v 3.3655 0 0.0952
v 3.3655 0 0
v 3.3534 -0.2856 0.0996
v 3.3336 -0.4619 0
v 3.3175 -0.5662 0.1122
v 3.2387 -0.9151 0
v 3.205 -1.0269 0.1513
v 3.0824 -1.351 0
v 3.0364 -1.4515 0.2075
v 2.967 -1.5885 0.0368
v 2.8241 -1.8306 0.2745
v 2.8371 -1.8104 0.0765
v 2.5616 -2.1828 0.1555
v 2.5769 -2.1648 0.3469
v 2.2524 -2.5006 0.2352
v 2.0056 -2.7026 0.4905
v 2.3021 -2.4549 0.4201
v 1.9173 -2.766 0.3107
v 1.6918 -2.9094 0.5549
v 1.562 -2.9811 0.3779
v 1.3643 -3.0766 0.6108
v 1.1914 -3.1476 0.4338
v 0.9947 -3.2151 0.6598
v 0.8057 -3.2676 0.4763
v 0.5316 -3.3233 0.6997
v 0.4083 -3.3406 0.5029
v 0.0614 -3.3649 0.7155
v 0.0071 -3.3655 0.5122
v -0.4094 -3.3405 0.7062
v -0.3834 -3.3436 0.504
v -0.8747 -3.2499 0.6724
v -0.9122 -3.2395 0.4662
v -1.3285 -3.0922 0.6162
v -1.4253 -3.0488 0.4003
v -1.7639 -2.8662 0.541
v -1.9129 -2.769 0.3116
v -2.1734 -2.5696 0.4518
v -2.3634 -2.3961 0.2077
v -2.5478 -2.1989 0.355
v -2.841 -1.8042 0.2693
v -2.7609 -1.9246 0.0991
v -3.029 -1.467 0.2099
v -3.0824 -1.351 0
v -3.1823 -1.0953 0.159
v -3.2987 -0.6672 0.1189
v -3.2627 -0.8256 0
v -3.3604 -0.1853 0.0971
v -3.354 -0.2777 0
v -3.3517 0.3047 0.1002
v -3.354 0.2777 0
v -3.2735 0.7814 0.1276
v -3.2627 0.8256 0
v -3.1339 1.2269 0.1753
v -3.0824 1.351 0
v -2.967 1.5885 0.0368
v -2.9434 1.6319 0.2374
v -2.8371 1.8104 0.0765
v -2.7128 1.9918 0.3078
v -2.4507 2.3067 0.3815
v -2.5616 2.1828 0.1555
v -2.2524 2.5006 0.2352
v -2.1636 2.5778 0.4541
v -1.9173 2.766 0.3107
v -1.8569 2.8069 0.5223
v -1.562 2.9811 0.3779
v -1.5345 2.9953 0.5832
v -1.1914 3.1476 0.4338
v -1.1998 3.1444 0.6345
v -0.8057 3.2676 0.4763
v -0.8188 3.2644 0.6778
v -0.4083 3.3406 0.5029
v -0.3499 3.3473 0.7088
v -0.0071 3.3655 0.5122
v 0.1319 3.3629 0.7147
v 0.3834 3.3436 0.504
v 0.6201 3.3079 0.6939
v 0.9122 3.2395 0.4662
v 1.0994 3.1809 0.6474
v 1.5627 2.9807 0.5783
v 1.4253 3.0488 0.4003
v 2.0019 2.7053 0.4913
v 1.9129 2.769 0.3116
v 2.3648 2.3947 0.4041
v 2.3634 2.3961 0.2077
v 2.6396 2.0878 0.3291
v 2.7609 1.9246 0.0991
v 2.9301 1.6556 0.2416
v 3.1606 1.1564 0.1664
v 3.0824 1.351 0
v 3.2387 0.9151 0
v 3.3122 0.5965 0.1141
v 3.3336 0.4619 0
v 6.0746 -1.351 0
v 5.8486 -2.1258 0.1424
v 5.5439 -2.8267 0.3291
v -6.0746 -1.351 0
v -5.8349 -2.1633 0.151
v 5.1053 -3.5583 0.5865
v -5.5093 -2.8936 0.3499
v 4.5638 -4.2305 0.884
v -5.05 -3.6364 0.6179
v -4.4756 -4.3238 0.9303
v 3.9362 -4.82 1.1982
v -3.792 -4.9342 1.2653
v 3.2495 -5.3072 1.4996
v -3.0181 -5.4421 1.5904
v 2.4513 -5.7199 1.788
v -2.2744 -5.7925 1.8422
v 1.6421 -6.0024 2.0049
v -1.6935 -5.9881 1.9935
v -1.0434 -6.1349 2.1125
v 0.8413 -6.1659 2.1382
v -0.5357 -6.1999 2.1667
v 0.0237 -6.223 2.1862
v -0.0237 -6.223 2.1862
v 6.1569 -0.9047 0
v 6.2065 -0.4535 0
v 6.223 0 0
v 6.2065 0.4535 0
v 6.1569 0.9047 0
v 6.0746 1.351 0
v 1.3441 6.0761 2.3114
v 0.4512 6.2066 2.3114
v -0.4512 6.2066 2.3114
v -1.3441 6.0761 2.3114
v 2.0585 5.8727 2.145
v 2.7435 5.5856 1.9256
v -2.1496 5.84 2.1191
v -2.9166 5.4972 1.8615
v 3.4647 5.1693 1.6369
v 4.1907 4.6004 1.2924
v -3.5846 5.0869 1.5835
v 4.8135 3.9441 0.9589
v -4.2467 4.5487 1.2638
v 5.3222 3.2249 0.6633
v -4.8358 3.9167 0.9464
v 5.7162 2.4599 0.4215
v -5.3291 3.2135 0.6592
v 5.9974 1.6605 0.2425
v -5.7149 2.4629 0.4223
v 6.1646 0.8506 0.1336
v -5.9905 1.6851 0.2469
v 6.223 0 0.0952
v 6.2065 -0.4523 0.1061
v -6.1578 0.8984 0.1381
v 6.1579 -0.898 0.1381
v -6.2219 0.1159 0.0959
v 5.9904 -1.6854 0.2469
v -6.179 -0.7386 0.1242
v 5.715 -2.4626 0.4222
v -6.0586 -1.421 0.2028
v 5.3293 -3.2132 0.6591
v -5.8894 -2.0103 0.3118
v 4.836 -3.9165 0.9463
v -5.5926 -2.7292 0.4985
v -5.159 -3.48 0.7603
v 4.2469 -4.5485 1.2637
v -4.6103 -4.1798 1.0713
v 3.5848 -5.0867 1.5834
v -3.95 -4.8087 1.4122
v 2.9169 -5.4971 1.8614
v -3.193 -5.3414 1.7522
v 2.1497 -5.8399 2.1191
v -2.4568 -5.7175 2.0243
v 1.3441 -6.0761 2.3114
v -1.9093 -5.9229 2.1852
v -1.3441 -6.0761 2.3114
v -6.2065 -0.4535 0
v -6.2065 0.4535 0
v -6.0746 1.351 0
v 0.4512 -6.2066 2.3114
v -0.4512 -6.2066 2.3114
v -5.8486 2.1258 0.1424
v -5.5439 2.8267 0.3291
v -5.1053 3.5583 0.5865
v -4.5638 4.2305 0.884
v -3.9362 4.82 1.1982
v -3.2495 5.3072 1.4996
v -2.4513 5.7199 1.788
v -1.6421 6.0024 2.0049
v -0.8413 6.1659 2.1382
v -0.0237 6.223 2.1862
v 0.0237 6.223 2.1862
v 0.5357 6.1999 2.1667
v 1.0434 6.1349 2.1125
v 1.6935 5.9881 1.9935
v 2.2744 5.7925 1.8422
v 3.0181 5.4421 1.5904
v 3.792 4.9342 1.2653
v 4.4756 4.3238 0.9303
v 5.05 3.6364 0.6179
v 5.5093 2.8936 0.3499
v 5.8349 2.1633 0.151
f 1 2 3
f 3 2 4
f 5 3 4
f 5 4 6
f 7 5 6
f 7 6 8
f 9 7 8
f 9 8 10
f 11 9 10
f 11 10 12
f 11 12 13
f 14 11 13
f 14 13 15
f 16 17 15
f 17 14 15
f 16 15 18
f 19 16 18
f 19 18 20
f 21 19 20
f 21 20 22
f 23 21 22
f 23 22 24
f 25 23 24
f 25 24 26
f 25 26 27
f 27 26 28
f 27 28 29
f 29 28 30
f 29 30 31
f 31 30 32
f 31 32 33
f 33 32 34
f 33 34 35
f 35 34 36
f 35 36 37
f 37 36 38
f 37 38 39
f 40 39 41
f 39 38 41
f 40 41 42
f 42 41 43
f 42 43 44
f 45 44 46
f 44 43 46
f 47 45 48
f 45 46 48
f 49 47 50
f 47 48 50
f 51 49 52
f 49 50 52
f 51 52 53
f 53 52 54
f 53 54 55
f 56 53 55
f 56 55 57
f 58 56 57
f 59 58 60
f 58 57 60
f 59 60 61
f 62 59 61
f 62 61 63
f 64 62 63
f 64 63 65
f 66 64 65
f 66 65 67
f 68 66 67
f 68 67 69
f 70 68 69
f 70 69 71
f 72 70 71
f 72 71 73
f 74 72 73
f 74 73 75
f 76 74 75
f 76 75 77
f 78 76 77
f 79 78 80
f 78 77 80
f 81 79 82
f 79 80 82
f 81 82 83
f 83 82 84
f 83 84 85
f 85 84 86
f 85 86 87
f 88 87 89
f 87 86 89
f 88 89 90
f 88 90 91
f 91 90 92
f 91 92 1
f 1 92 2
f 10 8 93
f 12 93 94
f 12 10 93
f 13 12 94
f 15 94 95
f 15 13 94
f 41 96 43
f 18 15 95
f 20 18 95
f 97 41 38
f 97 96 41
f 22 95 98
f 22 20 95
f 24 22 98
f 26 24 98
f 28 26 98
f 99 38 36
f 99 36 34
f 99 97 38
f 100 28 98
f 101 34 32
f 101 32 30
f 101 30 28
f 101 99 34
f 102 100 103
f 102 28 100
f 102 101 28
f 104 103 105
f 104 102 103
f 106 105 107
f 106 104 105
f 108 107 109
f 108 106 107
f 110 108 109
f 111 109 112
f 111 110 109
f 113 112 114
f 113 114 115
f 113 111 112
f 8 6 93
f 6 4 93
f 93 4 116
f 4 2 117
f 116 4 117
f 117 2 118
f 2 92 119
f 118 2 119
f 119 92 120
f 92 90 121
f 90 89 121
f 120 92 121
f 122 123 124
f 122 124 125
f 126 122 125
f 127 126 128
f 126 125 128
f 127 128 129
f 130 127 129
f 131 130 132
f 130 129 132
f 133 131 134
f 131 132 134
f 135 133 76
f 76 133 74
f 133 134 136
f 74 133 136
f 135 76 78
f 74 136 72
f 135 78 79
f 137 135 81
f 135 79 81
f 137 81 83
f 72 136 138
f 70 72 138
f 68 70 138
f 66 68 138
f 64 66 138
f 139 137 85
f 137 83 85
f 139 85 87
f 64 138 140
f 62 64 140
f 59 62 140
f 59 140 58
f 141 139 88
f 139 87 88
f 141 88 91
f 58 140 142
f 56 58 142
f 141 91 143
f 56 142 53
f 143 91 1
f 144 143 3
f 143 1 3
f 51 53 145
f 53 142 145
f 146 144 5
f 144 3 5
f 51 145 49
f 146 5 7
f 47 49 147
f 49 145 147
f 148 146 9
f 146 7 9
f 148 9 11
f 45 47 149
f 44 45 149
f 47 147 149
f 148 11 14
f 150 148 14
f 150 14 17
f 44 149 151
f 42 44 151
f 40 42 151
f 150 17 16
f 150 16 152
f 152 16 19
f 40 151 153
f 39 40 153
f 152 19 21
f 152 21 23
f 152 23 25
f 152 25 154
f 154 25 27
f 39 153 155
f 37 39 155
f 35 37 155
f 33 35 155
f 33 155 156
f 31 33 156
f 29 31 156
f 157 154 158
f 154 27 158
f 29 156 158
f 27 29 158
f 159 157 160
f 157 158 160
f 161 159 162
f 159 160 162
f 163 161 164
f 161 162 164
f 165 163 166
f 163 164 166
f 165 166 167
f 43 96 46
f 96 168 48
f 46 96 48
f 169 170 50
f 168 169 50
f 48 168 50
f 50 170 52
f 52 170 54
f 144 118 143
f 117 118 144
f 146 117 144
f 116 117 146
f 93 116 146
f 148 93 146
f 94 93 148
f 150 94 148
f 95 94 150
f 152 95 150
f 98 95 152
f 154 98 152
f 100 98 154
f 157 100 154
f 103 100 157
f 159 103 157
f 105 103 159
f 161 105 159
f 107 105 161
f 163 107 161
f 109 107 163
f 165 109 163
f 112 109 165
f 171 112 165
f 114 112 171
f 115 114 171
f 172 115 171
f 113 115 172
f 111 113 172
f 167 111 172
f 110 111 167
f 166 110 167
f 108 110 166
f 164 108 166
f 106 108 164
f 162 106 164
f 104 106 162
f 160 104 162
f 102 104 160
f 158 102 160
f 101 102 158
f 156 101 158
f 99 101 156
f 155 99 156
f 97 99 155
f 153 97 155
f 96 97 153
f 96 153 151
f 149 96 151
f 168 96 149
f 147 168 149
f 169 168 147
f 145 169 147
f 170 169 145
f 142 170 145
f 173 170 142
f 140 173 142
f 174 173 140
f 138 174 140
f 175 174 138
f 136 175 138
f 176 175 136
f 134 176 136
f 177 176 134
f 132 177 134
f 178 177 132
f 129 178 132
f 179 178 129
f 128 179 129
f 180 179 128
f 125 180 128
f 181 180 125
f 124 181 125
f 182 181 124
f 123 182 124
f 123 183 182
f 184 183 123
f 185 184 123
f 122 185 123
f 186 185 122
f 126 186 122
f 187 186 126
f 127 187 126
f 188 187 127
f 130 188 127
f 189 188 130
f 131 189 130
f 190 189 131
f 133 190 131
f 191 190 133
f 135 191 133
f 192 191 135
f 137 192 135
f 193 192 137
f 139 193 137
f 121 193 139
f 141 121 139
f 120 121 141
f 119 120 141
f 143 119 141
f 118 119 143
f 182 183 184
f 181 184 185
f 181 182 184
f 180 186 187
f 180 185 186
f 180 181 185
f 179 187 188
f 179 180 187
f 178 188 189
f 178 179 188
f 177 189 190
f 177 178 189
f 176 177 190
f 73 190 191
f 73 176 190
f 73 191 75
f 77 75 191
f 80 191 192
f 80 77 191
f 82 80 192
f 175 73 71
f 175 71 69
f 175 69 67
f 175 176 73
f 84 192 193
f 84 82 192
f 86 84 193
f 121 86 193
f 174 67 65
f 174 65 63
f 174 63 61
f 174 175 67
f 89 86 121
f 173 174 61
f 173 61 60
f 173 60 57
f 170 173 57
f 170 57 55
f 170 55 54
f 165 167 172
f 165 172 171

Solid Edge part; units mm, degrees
sketch "Sketch1" plane through (0, 0, 0) normal (0, 0, 1) x (1, 0, 0)
  circle A0 centre (0, 0) radius 3.3655
  circle A1 centre (0, 0) radius 6.223
  dimension "D1" = 12.446
  dimension "D2" = 6.731
extrude "Protrusion1" add sketch "Sketch1" along normal blind 2.3114
sketch "Sketch2" plane through (0, 0, 0) normal (1, 0, 0) x (0, 1, 0)
  arc A0 (-6.0761, 2.3114) -> (6.0761, 2.3114) centre (0, 9.5328) ccw
  line L0 (-6.0761, 2.3114) -> (6.0761, 2.3114)
  arc A1 (-6.223, 2.1861) -> (-1.351, 0) centre (0, 9.5328) ccw
  line L1 (-1.351, 0) -> (-6.223, 0)
  line L2 (-6.223, 2.1861) -> (-6.223, 0)
  line L3 (6.223, 0) -> (1.351, 0)
  arc A2 (1.351, 0) -> (6.223, 2.1861) centre (0, 9.5328) ccw
  line L4 (6.223, 0) -> (6.223, 2.1861)
  dimension "D1" = 0.0952
extrude "ExtrudedCutout_1" cut sketch "Sketch2" along normal mid plane 38.1
